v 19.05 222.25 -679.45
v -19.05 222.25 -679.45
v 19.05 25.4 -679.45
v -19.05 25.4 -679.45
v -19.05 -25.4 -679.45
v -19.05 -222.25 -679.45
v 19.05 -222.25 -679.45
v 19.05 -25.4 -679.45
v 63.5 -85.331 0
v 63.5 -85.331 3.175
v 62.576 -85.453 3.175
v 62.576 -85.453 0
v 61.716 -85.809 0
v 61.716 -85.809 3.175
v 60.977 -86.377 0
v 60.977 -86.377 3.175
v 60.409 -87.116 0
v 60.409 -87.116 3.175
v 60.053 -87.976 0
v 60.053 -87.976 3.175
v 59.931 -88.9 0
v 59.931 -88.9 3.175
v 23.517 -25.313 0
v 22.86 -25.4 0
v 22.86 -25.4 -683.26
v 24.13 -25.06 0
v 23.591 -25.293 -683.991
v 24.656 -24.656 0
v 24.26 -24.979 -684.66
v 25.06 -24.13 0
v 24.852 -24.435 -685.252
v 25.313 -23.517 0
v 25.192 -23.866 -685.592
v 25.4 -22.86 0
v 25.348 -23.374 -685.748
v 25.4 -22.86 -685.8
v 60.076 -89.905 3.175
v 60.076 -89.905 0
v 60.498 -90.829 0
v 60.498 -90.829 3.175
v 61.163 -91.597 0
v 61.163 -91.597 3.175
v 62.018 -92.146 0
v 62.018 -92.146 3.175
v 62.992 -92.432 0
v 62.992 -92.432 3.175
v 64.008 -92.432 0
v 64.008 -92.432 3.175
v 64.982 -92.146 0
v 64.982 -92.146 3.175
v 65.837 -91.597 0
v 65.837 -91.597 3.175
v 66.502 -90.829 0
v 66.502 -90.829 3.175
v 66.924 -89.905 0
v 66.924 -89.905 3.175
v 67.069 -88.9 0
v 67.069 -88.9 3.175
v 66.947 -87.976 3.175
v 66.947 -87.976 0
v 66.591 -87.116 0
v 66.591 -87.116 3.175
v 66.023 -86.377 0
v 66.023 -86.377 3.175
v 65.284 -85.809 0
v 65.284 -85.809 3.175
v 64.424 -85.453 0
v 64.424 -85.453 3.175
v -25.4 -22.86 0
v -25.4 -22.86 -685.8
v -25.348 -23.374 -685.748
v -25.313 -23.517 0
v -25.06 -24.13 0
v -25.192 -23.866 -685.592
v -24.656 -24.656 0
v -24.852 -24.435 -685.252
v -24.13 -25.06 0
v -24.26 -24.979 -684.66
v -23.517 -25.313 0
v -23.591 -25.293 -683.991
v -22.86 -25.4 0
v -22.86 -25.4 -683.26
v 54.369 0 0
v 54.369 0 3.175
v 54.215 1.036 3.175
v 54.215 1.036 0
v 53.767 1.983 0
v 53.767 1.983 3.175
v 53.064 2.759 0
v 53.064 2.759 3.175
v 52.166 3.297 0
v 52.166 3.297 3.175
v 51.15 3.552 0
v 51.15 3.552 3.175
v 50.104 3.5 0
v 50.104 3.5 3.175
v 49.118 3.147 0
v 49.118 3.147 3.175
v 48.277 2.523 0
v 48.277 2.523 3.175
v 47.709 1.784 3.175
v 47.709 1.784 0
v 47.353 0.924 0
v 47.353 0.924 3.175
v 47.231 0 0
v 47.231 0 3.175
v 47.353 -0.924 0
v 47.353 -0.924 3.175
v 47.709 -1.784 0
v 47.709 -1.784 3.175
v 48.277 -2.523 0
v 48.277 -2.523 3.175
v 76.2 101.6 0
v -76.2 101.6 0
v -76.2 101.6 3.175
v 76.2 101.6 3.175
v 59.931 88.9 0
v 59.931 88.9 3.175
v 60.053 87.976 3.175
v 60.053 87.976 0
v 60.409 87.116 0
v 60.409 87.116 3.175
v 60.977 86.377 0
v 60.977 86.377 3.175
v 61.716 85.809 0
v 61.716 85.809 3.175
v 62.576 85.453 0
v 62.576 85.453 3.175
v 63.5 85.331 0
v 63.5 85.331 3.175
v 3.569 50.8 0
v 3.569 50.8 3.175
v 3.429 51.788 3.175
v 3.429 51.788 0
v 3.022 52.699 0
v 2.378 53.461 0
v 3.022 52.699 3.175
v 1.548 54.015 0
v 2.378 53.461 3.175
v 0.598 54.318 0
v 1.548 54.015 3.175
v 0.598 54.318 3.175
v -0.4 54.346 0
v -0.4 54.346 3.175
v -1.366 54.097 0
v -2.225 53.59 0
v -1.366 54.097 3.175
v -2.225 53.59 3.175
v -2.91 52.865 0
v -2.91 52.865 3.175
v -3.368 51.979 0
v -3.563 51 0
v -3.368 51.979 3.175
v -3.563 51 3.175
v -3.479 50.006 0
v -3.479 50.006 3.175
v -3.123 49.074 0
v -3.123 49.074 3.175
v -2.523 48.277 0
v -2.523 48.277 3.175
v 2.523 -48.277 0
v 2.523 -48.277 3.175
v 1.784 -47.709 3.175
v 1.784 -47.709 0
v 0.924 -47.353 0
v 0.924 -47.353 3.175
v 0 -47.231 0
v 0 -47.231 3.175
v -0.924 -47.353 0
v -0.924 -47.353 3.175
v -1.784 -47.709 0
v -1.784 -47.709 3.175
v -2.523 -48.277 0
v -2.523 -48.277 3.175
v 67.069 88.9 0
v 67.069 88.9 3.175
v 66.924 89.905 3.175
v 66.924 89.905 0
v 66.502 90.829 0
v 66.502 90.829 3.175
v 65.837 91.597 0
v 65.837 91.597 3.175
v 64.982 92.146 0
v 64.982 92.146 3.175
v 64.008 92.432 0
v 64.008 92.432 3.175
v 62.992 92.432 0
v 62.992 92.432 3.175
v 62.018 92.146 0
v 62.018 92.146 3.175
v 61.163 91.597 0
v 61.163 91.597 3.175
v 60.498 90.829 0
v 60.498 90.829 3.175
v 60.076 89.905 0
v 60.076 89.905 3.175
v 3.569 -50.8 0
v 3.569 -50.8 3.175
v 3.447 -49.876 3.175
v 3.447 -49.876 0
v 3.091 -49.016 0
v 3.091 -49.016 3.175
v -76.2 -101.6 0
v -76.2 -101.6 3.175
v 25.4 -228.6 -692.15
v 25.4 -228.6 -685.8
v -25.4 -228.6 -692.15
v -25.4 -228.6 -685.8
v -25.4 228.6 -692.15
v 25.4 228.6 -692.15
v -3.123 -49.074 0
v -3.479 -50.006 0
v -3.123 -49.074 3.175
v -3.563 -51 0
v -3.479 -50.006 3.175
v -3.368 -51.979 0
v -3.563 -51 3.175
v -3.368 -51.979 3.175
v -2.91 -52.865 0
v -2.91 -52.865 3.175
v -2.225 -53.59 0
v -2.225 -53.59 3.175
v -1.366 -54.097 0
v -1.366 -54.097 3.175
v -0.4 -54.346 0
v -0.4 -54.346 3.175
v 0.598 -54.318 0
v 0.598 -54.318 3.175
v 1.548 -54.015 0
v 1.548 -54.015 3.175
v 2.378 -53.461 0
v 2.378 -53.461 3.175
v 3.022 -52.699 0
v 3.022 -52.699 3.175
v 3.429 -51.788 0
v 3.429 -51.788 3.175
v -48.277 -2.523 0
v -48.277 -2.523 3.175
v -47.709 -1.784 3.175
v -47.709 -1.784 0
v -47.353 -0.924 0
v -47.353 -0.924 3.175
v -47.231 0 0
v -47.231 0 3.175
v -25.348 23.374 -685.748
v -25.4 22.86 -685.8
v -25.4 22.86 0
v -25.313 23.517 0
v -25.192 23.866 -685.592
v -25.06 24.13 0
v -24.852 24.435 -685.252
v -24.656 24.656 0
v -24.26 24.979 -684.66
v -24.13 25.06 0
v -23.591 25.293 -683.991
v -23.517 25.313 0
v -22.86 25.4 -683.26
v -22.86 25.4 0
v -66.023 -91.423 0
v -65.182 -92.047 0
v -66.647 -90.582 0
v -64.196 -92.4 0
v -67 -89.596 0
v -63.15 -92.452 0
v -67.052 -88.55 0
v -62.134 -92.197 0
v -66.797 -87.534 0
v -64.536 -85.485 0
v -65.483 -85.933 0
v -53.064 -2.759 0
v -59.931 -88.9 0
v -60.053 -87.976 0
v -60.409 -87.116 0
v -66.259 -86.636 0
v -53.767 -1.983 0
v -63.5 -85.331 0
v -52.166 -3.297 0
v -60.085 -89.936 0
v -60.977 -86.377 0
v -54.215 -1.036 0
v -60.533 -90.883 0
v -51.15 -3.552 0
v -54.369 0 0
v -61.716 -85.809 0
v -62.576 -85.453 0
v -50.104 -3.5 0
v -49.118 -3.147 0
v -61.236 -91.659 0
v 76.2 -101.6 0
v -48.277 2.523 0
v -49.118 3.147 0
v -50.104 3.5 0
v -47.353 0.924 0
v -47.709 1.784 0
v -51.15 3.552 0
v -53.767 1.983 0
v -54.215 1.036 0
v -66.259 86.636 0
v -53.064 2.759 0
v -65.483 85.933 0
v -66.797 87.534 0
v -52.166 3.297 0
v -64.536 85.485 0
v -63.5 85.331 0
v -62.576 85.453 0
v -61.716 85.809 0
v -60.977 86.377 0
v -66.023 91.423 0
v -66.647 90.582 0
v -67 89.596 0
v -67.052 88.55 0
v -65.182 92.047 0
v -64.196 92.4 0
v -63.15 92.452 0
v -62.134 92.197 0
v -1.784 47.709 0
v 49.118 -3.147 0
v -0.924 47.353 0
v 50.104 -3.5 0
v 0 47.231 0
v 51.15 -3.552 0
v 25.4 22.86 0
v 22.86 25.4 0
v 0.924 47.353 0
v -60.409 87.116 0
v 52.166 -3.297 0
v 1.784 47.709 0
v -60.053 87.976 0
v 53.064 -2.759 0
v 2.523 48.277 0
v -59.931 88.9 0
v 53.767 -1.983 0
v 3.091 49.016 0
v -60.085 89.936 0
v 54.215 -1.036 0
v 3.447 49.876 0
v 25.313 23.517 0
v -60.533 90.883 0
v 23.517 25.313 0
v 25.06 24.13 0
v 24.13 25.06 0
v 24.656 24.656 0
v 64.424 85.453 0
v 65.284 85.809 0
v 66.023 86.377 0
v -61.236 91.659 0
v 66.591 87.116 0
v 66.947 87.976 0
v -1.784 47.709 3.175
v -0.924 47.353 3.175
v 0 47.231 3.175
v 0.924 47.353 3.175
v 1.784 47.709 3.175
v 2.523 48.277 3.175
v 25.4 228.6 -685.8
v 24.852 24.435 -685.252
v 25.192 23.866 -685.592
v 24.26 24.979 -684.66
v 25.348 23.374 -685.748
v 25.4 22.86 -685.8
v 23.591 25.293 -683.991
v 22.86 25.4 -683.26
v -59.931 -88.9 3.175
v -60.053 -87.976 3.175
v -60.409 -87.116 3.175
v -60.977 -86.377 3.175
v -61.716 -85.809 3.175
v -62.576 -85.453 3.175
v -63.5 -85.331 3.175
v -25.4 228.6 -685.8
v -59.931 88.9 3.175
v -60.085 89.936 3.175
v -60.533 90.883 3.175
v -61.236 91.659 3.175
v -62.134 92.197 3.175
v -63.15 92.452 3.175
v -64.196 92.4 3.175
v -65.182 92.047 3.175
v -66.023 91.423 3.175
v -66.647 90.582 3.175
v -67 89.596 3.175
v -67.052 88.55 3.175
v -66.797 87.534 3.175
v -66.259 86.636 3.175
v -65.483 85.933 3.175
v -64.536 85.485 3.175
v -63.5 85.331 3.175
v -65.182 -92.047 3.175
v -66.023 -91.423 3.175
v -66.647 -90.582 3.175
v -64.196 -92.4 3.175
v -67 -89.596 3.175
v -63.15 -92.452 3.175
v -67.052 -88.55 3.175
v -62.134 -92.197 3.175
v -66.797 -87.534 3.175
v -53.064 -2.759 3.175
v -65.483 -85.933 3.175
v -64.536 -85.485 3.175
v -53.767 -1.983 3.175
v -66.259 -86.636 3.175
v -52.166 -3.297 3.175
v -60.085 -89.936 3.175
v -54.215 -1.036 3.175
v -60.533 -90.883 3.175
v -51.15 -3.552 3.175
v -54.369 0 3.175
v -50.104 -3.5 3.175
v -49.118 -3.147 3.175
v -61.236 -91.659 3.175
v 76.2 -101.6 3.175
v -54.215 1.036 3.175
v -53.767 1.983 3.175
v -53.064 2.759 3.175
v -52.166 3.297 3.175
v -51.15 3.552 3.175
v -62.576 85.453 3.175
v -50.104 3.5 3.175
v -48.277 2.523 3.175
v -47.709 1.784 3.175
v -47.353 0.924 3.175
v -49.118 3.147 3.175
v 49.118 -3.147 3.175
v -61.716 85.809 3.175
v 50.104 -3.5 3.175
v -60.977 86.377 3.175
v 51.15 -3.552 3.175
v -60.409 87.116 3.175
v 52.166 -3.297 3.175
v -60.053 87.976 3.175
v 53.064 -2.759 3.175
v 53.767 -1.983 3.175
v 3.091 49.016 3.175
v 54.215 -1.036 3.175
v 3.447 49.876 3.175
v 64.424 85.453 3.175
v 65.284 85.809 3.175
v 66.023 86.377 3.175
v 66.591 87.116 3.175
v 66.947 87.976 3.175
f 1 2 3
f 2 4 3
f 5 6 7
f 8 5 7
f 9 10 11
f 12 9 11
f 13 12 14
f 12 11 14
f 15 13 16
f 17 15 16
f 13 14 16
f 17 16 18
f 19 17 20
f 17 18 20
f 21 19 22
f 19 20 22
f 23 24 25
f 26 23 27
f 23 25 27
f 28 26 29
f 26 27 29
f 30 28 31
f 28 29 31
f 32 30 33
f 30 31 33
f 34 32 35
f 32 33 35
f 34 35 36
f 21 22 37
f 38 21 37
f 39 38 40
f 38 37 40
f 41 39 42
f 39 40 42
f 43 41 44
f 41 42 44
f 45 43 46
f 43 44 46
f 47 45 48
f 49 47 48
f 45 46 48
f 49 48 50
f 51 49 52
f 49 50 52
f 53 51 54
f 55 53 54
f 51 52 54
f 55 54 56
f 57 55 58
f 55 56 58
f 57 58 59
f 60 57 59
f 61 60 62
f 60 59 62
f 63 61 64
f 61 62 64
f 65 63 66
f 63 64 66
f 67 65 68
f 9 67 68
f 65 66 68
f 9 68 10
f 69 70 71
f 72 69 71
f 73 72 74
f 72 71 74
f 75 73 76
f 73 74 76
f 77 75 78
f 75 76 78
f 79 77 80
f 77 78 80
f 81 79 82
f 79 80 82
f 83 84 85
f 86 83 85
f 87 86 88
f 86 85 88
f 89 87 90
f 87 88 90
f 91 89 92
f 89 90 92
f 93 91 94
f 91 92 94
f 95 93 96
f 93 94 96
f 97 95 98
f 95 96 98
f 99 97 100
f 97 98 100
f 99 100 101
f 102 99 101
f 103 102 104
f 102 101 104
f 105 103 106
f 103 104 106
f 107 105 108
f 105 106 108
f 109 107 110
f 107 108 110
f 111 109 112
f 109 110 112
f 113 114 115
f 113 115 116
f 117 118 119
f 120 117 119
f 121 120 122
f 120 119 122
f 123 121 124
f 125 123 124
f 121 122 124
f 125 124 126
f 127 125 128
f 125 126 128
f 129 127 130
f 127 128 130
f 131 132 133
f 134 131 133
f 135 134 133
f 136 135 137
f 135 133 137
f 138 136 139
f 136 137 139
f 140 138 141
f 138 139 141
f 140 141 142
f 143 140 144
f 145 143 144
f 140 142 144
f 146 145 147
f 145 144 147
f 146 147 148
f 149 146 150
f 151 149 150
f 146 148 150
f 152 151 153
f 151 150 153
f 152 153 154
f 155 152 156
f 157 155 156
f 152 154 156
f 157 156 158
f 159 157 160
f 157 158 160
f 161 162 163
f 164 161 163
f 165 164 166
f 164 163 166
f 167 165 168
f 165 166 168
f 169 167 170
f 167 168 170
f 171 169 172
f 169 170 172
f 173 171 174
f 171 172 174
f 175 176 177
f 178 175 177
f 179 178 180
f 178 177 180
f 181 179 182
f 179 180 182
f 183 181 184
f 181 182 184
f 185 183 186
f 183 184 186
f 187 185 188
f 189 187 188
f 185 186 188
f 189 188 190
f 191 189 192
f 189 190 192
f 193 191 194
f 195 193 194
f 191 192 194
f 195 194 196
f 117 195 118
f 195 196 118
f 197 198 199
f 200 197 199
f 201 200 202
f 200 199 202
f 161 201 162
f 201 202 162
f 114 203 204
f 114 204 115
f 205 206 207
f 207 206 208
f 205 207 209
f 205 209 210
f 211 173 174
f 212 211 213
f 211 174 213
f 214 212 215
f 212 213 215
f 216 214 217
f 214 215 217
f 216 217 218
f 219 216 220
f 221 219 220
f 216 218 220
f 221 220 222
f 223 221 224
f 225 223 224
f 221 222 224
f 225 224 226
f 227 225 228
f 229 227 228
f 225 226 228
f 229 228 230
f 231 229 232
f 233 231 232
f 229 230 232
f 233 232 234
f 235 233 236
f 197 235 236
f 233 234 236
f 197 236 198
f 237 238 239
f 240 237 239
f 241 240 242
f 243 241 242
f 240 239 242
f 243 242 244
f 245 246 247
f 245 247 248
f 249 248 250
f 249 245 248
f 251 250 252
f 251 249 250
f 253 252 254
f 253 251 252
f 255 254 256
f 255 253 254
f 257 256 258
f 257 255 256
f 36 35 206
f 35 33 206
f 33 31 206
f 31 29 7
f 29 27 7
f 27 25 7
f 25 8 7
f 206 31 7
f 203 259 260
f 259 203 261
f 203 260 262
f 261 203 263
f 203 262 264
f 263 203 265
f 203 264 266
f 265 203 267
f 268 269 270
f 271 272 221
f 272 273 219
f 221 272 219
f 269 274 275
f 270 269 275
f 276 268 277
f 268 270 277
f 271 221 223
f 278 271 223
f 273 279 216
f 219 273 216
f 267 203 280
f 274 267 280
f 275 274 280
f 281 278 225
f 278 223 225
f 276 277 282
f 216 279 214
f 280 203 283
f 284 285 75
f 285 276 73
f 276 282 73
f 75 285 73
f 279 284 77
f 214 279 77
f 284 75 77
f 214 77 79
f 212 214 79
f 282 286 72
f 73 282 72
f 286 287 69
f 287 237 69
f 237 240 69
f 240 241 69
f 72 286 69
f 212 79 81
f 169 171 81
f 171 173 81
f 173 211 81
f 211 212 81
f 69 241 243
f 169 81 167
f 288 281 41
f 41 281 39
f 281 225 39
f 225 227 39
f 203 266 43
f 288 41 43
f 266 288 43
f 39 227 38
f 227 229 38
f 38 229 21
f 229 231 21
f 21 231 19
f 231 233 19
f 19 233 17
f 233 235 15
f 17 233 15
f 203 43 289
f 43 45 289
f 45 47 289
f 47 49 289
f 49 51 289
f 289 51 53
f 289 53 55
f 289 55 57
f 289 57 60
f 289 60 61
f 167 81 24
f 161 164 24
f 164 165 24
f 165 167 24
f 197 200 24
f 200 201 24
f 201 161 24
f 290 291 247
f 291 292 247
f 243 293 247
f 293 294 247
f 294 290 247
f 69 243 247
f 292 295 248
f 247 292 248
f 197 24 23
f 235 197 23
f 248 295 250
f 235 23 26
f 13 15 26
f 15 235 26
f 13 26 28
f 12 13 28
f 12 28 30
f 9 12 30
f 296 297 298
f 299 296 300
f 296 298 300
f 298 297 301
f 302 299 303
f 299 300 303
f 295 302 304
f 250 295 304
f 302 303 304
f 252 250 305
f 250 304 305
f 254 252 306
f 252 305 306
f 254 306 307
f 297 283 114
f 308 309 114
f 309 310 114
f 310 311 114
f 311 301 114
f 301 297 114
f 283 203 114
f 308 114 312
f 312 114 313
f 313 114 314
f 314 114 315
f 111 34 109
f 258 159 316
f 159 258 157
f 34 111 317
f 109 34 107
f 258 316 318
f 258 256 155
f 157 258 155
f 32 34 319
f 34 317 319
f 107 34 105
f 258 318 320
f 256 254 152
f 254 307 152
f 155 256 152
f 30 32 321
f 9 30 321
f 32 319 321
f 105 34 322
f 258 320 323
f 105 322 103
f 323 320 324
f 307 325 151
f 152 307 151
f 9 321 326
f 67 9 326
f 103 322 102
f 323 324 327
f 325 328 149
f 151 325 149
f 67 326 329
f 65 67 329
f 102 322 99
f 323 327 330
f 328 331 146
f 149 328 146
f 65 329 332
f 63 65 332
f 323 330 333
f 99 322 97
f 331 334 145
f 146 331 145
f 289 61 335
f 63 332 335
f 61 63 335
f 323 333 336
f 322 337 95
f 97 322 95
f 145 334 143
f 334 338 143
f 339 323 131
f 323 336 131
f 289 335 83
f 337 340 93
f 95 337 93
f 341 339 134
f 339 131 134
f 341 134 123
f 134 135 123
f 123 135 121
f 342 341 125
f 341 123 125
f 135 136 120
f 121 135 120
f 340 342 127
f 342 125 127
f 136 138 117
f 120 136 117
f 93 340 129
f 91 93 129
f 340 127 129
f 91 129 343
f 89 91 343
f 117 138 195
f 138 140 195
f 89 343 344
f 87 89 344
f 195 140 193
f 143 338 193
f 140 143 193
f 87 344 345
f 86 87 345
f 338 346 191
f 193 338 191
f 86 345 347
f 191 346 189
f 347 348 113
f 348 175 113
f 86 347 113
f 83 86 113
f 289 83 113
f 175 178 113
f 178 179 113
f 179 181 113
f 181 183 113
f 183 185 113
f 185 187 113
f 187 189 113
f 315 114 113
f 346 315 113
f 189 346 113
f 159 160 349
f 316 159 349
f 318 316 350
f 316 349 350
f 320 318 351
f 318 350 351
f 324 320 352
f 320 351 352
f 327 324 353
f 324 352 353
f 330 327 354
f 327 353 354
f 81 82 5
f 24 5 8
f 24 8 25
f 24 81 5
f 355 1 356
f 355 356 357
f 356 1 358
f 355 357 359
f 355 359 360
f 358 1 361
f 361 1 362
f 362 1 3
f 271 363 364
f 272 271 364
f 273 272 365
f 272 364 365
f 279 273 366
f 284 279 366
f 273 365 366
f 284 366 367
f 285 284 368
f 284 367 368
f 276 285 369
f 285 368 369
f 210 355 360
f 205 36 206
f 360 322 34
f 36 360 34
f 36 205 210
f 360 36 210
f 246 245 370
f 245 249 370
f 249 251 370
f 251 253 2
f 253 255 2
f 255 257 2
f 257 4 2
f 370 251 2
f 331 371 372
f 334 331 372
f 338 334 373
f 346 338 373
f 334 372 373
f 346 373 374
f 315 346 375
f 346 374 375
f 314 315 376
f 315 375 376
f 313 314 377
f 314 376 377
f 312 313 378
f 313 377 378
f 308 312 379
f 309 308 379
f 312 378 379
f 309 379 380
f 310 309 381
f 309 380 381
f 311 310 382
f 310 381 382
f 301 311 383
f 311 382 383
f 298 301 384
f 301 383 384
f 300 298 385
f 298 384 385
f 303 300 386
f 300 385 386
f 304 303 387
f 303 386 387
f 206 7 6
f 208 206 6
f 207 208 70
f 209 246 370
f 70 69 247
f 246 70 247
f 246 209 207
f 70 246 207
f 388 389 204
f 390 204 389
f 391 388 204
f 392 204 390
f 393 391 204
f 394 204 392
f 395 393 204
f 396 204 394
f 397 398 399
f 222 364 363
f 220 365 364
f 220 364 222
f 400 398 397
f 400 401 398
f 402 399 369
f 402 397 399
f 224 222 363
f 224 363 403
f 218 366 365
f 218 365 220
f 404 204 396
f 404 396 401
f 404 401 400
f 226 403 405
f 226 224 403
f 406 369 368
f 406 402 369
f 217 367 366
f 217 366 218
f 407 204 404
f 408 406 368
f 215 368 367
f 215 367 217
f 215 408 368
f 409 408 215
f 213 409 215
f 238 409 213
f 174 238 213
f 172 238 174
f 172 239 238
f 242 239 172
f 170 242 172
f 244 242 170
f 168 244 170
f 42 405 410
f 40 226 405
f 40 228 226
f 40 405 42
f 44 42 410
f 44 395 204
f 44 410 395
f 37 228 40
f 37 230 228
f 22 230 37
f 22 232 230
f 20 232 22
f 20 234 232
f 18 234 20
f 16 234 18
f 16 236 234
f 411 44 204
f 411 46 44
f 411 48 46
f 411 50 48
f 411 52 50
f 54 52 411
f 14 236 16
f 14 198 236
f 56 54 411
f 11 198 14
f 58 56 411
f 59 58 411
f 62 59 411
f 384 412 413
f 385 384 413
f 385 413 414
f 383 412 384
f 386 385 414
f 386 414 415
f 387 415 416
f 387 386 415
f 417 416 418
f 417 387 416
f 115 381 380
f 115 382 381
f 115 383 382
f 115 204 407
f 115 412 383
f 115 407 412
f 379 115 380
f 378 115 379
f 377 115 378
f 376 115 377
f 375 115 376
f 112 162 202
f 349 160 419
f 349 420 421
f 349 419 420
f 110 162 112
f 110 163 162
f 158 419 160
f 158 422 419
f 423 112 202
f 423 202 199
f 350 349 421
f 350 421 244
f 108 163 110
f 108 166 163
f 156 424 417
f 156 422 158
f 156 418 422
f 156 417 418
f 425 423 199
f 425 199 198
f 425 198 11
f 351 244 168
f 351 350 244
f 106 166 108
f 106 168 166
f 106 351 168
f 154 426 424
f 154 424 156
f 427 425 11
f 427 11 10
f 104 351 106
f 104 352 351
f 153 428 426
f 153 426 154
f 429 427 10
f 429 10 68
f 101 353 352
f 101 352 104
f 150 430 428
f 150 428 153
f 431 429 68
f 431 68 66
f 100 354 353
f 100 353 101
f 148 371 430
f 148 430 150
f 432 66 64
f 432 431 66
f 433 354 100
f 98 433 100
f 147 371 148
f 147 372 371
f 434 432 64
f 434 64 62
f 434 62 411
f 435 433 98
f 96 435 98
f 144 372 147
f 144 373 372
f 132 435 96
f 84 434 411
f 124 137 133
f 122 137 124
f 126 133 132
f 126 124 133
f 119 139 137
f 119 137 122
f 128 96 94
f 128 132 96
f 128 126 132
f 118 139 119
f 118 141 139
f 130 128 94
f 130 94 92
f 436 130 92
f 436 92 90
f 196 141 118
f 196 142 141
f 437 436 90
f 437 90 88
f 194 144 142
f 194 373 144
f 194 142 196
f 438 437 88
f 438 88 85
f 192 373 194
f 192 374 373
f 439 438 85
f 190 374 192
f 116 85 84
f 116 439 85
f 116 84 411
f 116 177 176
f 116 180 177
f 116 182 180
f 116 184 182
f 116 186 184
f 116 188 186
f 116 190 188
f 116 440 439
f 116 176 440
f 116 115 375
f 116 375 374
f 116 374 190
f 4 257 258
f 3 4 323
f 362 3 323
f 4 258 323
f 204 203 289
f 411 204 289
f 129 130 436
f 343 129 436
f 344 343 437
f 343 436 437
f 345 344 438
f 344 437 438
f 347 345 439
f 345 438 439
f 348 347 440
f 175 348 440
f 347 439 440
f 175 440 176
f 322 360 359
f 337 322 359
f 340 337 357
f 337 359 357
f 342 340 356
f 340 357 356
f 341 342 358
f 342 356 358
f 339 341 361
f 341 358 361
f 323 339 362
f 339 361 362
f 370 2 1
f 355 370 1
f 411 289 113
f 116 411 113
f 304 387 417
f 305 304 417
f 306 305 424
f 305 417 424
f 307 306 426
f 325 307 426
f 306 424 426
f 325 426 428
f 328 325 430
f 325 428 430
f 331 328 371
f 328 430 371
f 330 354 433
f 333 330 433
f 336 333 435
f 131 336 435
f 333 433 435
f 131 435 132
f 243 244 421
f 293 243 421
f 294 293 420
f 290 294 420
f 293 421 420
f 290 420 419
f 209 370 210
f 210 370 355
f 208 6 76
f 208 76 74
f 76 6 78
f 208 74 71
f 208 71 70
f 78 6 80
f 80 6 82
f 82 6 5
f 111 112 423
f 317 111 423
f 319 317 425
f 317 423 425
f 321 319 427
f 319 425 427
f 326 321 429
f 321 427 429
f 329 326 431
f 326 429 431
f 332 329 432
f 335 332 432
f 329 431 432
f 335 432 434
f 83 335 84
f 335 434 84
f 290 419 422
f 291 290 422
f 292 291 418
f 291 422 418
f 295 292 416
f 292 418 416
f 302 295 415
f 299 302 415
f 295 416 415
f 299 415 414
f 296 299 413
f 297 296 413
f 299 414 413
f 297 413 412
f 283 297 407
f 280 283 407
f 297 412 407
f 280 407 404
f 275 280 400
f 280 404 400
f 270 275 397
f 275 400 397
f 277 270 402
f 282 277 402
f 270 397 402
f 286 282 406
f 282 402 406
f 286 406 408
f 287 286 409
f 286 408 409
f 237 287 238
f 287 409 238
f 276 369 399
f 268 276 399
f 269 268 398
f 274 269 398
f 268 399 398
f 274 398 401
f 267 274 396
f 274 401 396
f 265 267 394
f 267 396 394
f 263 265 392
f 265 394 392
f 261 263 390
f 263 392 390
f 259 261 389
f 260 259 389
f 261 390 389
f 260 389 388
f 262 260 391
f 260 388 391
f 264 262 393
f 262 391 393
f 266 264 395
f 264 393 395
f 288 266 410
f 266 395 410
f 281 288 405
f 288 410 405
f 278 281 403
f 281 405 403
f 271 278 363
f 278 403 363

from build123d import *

# Parameters (mm, degrees)
F0_W     = 152.4
F0_H     = 203.2
F1_DEPTH = 3.175
F3_DEPTH = 25.4
F4_W     = 50.8
F4_H     = 50.8
F5_DEPTH = 679.45
F6_R     = 2.54
F8_DEPTH = 12.7
F9_SIZE2 = 6.35
F9_SIZE  = 6.35
F10_SIZE = 6.35


with BuildPart() as f1:
    # F0 (on Top) → F1 (new body)
    with BuildSketch(Plane.XY):
        Rectangle(F0_W, F0_H)
    extrude(amount=F1_DEPTH)

    # F2 (on face) → F3 (cut)
    with BuildSketch(Plane.XY.offset(3.175)):
        with BuildLine():
            Line((-2.523452, 48.276548), (0, 50.8))
            Line((0, 50.8), (2.523452, 48.276548))
            ThreePointArc((2.523452, 48.276548), (3.297049, 49.434318), (3.5687, 50.8))
            ThreePointArc((3.5687, 50.8), (-1.365682, 54.097049), (-2.523452, 48.276548))
        make_face()
        with BuildLine():
            Line((2.523452, 48.276548), (0, 50.8))
            Line((0, 50.8), (-2.523452, 48.276548))
            ThreePointArc((-2.523452, 48.276548), (0, 47.2313), (2.523452, 48.276548))
        make_face()
        with BuildLine():
            Line((-50.8, 0), (-48.276548, 2.523452))
            ThreePointArc((-48.276548, 2.523452), (-54.3687, 0), (-48.276548, -2.523452))
            Line((-48.276548, -2.523452), (-50.8, 0))
        make_face()
        with BuildLine():
            ThreePointArc((-47.2313, 0), (-47.502951, 1.365682), (-48.276548, 2.523452))
            Line((-48.276548, 2.523452), (-50.8, 0))
            Line((-50.8, 0), (-48.276548, -2.523452))
            ThreePointArc((-48.276548, -2.523452), (-47.502951, -1.365682), (-47.2313, 0))
        make_face()
        with BuildLine():
            Line((50.8, 0), (48.276548, 2.523452))
            ThreePointArc((48.276548, 2.523452), (47.2313, 0), (48.276548, -2.523452))
            Line((48.276548, -2.523452), (50.8, 0))
        make_face()
        with BuildLine():
            ThreePointArc((54.3687, 0), (52.165682, 3.297049), (48.276548, 2.523452))
            Line((48.276548, 2.523452), (50.8, 0))
            Line((50.8, 0), (48.276548, -2.523452))
            ThreePointArc((48.276548, -2.523452), (52.165682, -3.297049), (54.3687, 0))
        make_face()
        with BuildLine():
            Line((0, -50.8), (2.523452, -48.276548))
            ThreePointArc((2.523452, -48.276548), (0, -47.2313), (-2.523452, -48.276548))
            Line((-2.523452, -48.276548), (0, -50.8))
        make_face()
        with BuildLine():
            ThreePointArc((3.5687, -50.8), (3.297049, -49.434318), (2.523452, -48.276548))
            Line((2.523452, -48.276548), (0, -50.8))
            Line((0, -50.8), (-2.523452, -48.276548))
            ThreePointArc((-2.523452, -48.276548), (-1.365682, -54.097049), (3.5687, -50.8))
        make_face()
        with BuildLine():
            ThreePointArc((-59.9313, -88.9), (-60.976548, -86.376548), (-63.5, -85.3313))
            Line((-63.5, -85.3313), (-63.5, -88.9))
            Line((-63.5, -88.9), (-59.9313, -88.9))
        make_face()
        with BuildLine():
            Line((-63.5, -88.9), (-63.5, -85.3313))
            ThreePointArc((-63.5, -85.3313), (-66.023452, -91.423452), (-59.9313, -88.9))
            Line((-59.9313, -88.9), (-63.5, -88.9))
        make_face()
        with BuildLine():
            Line((63.5, -88.9), (63.5, -85.3313))
            ThreePointArc((63.5, -85.3313), (60.976548, -86.376548), (59.9313, -88.9))
            Line((59.9313, -88.9), (63.5, -88.9))
        make_face()
        with BuildLine():
            ThreePointArc((67.0687, -88.9), (66.023452, -86.376548), (63.5, -85.3313))
            Line((63.5, -85.3313), (63.5, -88.9))
            Line((63.5, -88.9), (59.9313, -88.9))
            ThreePointArc((59.9313, -88.9), (63.5, -92.4687), (67.0687, -88.9))
        make_face()
        with BuildLine():
            ThreePointArc((67.0687, 88.9), (63.5, 92.4687), (59.9313, 88.9))
            Line((59.9313, 88.9), (63.5, 88.9))
            Line((63.5, 88.9), (63.5, 85.3313))
            ThreePointArc((63.5, 85.3313), (66.023452, 86.376548), (67.0687, 88.9))
        make_face()
        with BuildLine():
            Line((63.5, 88.9), (59.9313, 88.9))
            ThreePointArc((59.9313, 88.9), (60.976548, 86.376548), (63.5, 85.3313))
            Line((63.5, 85.3313), (63.5, 88.9))
        make_face()
        with BuildLine():
            Line((-63.5, 88.9), (-59.9313, 88.9))
            ThreePointArc((-59.9313, 88.9), (-66.023452, 91.423452), (-63.5, 85.3313))
            Line((-63.5, 85.3313), (-63.5, 88.9))
        make_face()
        with BuildLine():
            ThreePointArc((-63.5, 85.3313), (-60.976548, 86.376548), (-59.9313, 88.9))
            Line((-59.9313, 88.9), (-63.5, 88.9))
            Line((-63.5, 88.9), (-63.5, 85.3313))
        make_face()
    extrude(amount=-F3_DEPTH, mode=Mode.SUBTRACT)

    # F4 (on face) → F5 (join)
    with BuildSketch(Plane(origin=(0, 0, 0), x_dir=(1, 0, 0), z_dir=(0, 0, -1))):
        Rectangle(F4_W, F4_H)
    extrude(amount=F5_DEPTH)

    # F6
    f6_edges = [f1.edges().sort_by_distance(p)[0] for p in [
        (-25.4, -25.4, -339.725),
        (25.4, -25.4, -339.725),
        (25.4, 25.4, -339.725),
        (-25.4, 25.4, -339.725),
    ]]
    fillet(f6_edges, radius=F6_R)

    # F7 (on face) → F8 (join)
    with BuildSketch(Plane(origin=(0, 0, -679.45), x_dir=(1, 0, 0), z_dir=(0, 0, -1))):
        with BuildLine():
            Line((25.4, 22.86), (25.4, 228.6))
            Line((25.4, 228.6), (-25.4, 228.6))
            Line((-25.4, 228.6), (-25.4, 22.86))
            ThreePointArc((-25.4, 22.86), (-24.656051, 24.656051), (-22.86, 25.4))
            Line((-22.86, 25.4), (22.86, 25.4))
            ThreePointArc((22.86, 25.4), (24.656051, 24.656051), (25.4, 22.86))
        make_face()
        with BuildLine():
            Line((25.4, -228.6), (25.4, -22.86))
            ThreePointArc((25.4, -22.86), (24.656051, -24.656051), (22.86, -25.4))
            Line((22.86, -25.4), (-22.86, -25.4))
            ThreePointArc((-22.86, -25.4), (-24.656051, -24.656051), (-25.4, -22.86))
            Line((-25.4, -22.86), (-25.4, -228.6))
            Line((-25.4, -228.6), (25.4, -228.6))
        make_face()
        with BuildLine():
            Line((25.4, -22.86), (25.4, 22.86))
            ThreePointArc((25.4, 22.86), (24.656051, 24.656051), (22.86, 25.4))
            Line((22.86, 25.4), (-22.86, 25.4))
            ThreePointArc((-22.86, 25.4), (-24.656051, 24.656051), (-25.4, 22.86))
            Line((-25.4, 22.86), (-25.4, -22.86))
            ThreePointArc((-25.4, -22.86), (-24.656051, -24.656051), (-22.86, -25.4))
            Line((-22.86, -25.4), (22.86, -25.4))
            ThreePointArc((22.86, -25.4), (24.656051, -24.656051), (25.4, -22.86))
        make_face()
    extrude(amount=F8_DEPTH)

    # F9
    f9_edges = [f1.edges().sort_by_distance(p)[0] for p in [
        (0, -228.6, -679.45),
        (0, 228.6, -679.45),
    ]]
    chamfer(f9_edges, length=F9_SIZE, length2=F9_SIZE2)

    # F10
    f10_edges = [f1.edges().sort_by_distance(p)[0] for p in [
        (25.4, -122.555, -679.45),
        (25.4, 122.555, -679.45),
        (-25.4, -122.555, -679.45),
        (-25.4, 122.555, -679.45),
    ]]
    chamfer(f10_edges, length=F10_SIZE)


solid = f1.part
